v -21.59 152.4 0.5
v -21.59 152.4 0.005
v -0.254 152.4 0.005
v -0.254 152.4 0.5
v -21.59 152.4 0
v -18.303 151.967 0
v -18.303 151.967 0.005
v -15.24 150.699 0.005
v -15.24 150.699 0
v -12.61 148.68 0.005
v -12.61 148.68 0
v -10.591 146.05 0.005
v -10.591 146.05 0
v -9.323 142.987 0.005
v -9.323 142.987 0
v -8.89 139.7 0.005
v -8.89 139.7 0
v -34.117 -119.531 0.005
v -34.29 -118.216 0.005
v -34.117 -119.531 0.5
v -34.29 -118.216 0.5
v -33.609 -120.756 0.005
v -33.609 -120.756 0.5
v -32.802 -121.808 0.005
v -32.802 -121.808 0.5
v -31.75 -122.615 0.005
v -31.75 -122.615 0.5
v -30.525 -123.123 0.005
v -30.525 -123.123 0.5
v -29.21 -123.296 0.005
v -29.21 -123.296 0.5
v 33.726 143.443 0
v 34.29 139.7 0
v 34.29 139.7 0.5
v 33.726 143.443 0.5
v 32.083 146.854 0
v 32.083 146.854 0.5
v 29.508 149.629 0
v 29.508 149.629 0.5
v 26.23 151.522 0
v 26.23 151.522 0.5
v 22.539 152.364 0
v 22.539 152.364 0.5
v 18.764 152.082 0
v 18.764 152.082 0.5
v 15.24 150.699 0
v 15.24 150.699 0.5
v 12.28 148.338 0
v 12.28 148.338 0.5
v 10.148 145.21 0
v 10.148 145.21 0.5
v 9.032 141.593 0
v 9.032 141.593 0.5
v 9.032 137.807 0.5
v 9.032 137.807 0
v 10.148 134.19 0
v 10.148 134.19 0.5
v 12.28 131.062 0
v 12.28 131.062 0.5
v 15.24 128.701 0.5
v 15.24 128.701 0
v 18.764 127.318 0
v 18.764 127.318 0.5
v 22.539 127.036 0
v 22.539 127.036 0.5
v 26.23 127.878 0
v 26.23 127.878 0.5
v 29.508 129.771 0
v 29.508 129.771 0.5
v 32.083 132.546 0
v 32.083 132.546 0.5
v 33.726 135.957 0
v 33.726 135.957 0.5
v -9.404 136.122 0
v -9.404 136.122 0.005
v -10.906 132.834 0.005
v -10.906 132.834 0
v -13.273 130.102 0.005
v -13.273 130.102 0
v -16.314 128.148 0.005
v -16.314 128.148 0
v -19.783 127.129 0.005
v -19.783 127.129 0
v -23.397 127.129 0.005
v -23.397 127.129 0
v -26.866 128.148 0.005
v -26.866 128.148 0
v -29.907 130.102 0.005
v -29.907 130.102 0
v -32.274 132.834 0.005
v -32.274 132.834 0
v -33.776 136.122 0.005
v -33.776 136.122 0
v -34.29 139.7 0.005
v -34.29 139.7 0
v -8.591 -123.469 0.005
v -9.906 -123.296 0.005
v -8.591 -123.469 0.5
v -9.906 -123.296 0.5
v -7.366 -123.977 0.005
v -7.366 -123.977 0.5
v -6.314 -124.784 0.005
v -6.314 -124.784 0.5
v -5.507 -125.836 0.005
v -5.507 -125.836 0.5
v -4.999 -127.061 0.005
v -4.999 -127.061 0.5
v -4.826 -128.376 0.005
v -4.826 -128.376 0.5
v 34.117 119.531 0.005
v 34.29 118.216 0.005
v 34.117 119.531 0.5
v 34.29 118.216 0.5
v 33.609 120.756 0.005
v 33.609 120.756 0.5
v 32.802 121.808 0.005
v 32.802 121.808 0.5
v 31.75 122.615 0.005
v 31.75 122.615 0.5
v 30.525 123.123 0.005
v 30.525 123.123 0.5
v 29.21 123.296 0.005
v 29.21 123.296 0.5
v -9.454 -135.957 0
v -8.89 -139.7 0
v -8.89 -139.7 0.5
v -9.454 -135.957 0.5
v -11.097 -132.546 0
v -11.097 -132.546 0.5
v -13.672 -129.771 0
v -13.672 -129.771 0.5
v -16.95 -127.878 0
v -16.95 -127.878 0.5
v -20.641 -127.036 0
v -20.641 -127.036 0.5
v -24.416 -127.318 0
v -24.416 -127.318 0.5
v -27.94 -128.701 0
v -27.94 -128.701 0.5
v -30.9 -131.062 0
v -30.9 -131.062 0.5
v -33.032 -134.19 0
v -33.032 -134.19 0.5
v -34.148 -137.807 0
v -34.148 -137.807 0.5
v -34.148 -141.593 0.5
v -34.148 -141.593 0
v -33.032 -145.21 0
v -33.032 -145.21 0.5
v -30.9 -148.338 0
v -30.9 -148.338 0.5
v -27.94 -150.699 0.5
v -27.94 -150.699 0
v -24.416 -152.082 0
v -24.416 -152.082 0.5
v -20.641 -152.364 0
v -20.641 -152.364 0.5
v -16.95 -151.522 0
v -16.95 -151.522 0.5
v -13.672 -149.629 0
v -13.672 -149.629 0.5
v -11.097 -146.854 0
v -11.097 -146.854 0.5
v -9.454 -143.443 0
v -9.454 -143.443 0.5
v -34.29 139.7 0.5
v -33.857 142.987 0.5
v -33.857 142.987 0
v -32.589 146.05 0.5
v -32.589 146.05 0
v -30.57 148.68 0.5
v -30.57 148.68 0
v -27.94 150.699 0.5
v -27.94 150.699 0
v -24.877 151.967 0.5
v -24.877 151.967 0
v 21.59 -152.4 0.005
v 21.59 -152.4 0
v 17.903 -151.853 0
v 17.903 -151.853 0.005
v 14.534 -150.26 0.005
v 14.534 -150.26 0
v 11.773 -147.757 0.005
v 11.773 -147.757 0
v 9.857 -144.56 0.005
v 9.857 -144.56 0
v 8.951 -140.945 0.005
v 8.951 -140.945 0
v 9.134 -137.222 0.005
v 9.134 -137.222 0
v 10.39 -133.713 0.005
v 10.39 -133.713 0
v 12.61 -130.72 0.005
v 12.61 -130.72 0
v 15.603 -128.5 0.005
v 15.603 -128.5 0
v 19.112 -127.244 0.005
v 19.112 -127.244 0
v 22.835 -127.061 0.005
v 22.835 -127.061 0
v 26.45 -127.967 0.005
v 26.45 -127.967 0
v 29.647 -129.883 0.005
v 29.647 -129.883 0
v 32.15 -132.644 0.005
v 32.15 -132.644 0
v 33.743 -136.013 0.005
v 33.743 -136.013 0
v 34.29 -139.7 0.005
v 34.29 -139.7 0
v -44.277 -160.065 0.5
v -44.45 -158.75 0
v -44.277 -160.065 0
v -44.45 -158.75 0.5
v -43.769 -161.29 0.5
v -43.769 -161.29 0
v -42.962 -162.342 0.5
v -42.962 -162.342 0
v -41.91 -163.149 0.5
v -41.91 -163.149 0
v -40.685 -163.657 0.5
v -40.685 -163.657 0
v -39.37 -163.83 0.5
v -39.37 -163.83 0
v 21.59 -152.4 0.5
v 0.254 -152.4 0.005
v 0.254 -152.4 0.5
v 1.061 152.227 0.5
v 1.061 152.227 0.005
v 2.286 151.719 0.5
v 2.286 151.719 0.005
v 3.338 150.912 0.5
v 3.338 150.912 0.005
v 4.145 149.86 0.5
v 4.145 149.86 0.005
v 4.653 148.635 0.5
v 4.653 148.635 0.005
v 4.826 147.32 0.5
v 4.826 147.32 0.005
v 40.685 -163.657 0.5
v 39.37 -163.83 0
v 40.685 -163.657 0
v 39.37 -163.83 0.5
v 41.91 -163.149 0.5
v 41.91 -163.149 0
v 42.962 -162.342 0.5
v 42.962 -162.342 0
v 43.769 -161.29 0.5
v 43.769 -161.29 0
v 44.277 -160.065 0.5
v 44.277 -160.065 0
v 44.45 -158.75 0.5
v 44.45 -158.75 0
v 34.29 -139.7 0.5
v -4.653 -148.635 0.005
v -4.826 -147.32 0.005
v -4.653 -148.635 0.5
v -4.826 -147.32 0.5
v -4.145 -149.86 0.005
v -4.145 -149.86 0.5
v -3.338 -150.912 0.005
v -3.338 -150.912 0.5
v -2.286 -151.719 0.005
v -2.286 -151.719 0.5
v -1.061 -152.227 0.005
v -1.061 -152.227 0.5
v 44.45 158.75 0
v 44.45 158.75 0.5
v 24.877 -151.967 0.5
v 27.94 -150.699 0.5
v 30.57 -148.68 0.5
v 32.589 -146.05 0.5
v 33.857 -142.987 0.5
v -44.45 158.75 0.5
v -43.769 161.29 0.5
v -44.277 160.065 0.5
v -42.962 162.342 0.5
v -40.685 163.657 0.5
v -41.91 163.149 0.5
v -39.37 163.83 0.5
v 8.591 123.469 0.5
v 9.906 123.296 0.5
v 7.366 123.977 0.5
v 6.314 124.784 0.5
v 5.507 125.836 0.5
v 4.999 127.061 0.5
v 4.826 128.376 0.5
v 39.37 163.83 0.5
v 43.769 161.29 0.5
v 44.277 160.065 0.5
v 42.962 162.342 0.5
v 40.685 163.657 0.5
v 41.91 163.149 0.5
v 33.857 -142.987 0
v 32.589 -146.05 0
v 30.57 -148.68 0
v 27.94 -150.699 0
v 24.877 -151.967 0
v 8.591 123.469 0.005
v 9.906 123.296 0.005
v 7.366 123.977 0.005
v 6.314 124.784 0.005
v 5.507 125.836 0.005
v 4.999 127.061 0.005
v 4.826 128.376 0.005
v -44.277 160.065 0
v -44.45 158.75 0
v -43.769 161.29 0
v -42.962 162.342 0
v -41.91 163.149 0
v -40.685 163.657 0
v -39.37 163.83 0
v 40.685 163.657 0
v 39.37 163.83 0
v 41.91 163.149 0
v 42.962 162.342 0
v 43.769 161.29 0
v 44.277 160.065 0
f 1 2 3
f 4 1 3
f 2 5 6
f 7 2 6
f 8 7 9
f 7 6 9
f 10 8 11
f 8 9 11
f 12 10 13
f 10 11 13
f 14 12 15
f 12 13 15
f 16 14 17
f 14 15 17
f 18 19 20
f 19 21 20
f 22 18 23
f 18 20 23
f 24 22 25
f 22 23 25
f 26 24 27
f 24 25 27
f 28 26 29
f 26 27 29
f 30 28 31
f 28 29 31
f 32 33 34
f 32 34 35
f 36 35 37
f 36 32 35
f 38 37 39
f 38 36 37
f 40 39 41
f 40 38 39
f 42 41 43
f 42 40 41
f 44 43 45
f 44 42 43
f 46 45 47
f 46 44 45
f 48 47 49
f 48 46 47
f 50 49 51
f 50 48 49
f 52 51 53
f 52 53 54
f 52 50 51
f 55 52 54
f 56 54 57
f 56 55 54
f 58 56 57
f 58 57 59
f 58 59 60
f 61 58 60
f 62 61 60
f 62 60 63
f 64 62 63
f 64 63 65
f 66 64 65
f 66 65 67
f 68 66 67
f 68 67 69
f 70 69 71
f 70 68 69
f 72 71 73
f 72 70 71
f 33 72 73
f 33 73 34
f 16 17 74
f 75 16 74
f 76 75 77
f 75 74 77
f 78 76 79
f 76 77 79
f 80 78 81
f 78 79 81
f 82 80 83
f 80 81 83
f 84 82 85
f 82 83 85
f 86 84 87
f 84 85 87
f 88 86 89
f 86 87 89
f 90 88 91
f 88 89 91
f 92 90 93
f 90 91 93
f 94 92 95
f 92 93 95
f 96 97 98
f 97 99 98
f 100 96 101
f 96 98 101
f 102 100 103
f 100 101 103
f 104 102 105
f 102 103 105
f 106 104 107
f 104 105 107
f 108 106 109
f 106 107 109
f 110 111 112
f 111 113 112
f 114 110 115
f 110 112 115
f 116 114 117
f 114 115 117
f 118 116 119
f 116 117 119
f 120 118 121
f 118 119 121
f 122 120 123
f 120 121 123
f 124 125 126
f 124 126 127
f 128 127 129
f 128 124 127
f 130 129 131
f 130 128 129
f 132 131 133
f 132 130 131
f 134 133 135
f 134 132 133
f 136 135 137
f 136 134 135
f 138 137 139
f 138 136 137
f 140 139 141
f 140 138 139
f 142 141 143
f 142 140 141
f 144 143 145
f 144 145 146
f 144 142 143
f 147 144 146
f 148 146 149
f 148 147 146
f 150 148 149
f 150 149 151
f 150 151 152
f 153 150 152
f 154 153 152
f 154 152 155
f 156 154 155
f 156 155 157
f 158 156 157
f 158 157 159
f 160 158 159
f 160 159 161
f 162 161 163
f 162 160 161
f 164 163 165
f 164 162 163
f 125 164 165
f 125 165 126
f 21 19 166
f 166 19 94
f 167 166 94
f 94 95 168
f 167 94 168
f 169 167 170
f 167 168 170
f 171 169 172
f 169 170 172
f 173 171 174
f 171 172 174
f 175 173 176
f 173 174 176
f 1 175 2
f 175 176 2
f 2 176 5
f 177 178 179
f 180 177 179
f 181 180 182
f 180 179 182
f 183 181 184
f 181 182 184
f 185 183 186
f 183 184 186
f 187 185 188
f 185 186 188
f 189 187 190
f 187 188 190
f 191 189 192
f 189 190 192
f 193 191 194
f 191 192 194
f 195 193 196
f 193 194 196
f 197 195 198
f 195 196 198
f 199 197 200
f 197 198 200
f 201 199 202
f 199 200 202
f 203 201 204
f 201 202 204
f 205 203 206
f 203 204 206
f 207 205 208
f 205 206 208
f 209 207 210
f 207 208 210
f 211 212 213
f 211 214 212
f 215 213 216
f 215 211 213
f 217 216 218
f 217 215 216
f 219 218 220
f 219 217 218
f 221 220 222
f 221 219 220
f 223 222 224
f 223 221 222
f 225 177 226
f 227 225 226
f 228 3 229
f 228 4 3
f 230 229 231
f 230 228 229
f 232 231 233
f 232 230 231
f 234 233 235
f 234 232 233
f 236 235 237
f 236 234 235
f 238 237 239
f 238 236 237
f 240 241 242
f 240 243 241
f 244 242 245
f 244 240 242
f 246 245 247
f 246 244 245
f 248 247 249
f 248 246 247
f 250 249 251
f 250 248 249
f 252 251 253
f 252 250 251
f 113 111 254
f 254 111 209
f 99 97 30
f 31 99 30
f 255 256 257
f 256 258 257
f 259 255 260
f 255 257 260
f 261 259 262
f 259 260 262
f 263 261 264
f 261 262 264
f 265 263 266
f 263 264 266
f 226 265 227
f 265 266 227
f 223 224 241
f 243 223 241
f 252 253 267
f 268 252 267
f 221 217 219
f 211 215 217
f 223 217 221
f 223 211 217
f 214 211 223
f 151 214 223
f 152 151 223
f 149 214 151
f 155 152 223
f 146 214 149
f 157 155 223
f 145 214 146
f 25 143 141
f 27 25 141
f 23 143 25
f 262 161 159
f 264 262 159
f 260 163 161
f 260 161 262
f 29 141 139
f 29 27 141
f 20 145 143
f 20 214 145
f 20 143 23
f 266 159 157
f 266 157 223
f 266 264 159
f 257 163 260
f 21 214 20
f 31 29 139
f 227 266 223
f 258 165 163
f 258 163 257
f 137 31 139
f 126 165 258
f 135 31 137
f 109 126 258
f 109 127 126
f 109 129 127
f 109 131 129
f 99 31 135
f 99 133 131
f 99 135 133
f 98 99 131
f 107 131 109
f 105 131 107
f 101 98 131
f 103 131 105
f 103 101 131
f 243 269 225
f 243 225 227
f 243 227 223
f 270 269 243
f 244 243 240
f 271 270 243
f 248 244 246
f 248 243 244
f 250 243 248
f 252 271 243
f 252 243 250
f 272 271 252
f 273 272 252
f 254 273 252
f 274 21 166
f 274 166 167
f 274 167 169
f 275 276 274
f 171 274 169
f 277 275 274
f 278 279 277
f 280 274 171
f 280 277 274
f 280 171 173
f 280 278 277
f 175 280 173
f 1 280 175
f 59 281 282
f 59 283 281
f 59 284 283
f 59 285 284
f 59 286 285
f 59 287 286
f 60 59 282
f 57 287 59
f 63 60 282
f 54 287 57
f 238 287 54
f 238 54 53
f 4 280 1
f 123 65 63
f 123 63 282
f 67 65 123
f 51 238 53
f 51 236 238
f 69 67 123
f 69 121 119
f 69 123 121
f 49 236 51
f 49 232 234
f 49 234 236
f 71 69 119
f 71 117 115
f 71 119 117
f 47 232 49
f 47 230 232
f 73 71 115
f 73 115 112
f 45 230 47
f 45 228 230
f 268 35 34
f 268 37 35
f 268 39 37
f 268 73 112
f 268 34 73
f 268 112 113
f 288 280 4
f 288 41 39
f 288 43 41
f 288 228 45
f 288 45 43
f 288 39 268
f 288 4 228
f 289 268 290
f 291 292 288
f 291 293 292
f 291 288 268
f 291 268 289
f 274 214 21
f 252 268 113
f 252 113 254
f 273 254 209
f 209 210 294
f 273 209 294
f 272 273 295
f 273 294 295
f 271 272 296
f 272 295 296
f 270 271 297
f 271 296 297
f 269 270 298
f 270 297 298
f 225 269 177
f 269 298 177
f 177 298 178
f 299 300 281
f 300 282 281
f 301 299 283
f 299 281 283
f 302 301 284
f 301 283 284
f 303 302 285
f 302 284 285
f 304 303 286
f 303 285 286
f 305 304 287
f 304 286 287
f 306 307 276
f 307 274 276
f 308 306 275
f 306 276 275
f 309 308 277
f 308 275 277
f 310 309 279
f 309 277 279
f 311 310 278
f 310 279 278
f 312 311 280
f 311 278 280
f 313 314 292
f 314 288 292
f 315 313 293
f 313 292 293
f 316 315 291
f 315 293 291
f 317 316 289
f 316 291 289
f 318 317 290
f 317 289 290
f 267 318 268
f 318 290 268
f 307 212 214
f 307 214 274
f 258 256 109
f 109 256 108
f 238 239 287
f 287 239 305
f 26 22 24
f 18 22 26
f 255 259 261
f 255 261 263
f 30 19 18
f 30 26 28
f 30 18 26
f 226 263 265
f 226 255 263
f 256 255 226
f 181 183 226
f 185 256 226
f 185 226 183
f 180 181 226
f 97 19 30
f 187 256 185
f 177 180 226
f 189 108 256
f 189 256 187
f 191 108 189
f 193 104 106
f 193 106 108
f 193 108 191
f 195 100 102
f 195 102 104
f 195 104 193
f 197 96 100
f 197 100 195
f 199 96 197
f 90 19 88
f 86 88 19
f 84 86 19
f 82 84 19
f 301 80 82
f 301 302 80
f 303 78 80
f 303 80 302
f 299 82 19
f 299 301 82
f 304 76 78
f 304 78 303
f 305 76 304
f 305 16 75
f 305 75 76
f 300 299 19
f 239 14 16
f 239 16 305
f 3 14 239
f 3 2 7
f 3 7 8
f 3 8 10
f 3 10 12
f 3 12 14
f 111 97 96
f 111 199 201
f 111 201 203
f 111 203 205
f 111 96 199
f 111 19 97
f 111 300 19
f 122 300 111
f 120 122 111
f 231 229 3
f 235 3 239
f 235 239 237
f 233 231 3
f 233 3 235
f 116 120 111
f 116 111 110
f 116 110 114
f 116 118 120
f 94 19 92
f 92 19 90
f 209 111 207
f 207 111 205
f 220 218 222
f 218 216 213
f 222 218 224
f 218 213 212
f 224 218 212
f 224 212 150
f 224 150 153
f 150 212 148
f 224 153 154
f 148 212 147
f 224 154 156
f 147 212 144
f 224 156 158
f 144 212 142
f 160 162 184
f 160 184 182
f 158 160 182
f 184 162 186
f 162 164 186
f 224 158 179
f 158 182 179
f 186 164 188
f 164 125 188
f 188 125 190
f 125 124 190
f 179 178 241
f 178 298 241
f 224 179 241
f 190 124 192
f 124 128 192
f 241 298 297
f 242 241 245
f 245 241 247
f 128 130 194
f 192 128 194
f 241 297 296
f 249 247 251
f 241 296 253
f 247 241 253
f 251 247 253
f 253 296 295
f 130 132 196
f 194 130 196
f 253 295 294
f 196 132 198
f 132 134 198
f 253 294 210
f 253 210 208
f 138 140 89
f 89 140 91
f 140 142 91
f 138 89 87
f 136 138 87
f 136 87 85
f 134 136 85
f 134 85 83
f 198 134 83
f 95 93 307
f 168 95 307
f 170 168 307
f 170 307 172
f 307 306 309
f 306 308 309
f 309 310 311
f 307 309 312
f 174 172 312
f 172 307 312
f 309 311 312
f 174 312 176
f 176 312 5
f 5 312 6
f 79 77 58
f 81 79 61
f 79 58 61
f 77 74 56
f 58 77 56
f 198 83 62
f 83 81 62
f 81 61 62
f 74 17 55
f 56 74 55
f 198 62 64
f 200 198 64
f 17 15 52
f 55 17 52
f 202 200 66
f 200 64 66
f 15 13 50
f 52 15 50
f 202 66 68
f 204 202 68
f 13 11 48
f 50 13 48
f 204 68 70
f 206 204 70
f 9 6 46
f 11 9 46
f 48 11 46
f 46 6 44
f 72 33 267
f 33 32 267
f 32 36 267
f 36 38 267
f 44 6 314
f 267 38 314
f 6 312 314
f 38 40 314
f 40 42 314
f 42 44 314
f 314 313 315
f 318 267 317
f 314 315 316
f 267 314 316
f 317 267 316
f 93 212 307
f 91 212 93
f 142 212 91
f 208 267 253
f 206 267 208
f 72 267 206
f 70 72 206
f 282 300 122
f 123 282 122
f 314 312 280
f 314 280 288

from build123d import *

# Parameters (mm, degrees)
F0_W     = 88.9
F0_H     = 327.66
F0_R     = 12.7
F1_DEPTH = 0.5
F2_DEPTH = 0.005
F3_R     = 5.08


# Not quite as in the source:
# - a feature names something its author has since deleted; it is built from what else it names


with BuildPart() as f1:
    # F0 (on Top) → F1 (new body)
    with BuildSketch(Plane.XY):
        Rectangle(F0_W, F0_H)
        with Locations((-21.59, -139.7)):
            Circle(F0_R, mode=Mode.SUBTRACT)
        with BuildLine():
            ThreePointArc((-34.29, 139.7), (-30.5702561211, 148.6802561211), (-21.59, 152.4))
            Line((-21.59, 152.4), (4.826, 152.4))
            Line((4.826, 152.4), (4.826, 123.2959434))
            Line((4.826, 123.2959434), (34.29, 123.2959434))
            Line((34.29, 123.2959434), (34.29, -139.7))
            ThreePointArc((34.29, -139.7), (30.5702561211, -148.6802561211), (21.59, -152.4))
            Line((21.59, -152.4), (-4.826, -152.4))
            Line((-4.826, -152.4), (-4.826, -123.2959434))
            Line((-4.826, -123.2959434), (-34.29, -123.2959434))
            Line((-34.29, -123.2959434), (-34.29, 139.7))
        make_face(mode=Mode.SUBTRACT)
        with Locations((21.59, 139.7)):
            Circle(F0_R, mode=Mode.SUBTRACT)
    extrude(amount=F1_DEPTH)

    # F0 (on Top) → F2 (join)
    with BuildSketch(Plane.XY):
        with BuildLine():
            ThreePointArc((-21.59, 152.4), (-12.6097438789, 148.6802561211), (-8.89, 139.7))
            ThreePointArc((-8.89, 139.7), (-21.59, 127), (-34.29, 139.7))
            Line((-34.29, 139.7), (-34.29, -123.2959434))
            Line((-34.29, -123.2959434), (-4.826, -123.2959434))
            Line((-4.826, -123.2959434), (-4.826, -152.4))
            Line((-4.826, -152.4), (21.59, -152.4))
            ThreePointArc((21.59, -152.4), (12.6097438789, -130.7197438789), (34.29, -139.7))
            Line((34.29, -139.7), (34.29, 123.2959434))
            Line((34.29, 123.2959434), (4.826, 123.2959434))
            Line((4.826, 123.2959434), (4.826, 152.4))
            Line((4.826, 152.4), (-21.59, 152.4))
        make_face()
    extrude(amount=F2_DEPTH)

    # F3
    f3_edges = [f1.edges().sort_by_distance(p)[0] for p in [
        (-44.45, 163.83, 0.25),
        (44.45, -163.83, 0.25),
        (-44.45, -163.83, 0.25),
        (44.45, 163.83, 0.25),
        (4.826, 152.4, 0.2525),
        (4.826, 123.295943, 0.2525),
        (34.29, 123.295943, 0.2525),
        (-4.826, -152.4, 0.2525),
        (-4.826, -123.295943, 0.2525),
        (-34.29, -123.295943, 0.2525),
    ]]
    fillet(f3_edges, radius=F3_R)


solid = f1.part
